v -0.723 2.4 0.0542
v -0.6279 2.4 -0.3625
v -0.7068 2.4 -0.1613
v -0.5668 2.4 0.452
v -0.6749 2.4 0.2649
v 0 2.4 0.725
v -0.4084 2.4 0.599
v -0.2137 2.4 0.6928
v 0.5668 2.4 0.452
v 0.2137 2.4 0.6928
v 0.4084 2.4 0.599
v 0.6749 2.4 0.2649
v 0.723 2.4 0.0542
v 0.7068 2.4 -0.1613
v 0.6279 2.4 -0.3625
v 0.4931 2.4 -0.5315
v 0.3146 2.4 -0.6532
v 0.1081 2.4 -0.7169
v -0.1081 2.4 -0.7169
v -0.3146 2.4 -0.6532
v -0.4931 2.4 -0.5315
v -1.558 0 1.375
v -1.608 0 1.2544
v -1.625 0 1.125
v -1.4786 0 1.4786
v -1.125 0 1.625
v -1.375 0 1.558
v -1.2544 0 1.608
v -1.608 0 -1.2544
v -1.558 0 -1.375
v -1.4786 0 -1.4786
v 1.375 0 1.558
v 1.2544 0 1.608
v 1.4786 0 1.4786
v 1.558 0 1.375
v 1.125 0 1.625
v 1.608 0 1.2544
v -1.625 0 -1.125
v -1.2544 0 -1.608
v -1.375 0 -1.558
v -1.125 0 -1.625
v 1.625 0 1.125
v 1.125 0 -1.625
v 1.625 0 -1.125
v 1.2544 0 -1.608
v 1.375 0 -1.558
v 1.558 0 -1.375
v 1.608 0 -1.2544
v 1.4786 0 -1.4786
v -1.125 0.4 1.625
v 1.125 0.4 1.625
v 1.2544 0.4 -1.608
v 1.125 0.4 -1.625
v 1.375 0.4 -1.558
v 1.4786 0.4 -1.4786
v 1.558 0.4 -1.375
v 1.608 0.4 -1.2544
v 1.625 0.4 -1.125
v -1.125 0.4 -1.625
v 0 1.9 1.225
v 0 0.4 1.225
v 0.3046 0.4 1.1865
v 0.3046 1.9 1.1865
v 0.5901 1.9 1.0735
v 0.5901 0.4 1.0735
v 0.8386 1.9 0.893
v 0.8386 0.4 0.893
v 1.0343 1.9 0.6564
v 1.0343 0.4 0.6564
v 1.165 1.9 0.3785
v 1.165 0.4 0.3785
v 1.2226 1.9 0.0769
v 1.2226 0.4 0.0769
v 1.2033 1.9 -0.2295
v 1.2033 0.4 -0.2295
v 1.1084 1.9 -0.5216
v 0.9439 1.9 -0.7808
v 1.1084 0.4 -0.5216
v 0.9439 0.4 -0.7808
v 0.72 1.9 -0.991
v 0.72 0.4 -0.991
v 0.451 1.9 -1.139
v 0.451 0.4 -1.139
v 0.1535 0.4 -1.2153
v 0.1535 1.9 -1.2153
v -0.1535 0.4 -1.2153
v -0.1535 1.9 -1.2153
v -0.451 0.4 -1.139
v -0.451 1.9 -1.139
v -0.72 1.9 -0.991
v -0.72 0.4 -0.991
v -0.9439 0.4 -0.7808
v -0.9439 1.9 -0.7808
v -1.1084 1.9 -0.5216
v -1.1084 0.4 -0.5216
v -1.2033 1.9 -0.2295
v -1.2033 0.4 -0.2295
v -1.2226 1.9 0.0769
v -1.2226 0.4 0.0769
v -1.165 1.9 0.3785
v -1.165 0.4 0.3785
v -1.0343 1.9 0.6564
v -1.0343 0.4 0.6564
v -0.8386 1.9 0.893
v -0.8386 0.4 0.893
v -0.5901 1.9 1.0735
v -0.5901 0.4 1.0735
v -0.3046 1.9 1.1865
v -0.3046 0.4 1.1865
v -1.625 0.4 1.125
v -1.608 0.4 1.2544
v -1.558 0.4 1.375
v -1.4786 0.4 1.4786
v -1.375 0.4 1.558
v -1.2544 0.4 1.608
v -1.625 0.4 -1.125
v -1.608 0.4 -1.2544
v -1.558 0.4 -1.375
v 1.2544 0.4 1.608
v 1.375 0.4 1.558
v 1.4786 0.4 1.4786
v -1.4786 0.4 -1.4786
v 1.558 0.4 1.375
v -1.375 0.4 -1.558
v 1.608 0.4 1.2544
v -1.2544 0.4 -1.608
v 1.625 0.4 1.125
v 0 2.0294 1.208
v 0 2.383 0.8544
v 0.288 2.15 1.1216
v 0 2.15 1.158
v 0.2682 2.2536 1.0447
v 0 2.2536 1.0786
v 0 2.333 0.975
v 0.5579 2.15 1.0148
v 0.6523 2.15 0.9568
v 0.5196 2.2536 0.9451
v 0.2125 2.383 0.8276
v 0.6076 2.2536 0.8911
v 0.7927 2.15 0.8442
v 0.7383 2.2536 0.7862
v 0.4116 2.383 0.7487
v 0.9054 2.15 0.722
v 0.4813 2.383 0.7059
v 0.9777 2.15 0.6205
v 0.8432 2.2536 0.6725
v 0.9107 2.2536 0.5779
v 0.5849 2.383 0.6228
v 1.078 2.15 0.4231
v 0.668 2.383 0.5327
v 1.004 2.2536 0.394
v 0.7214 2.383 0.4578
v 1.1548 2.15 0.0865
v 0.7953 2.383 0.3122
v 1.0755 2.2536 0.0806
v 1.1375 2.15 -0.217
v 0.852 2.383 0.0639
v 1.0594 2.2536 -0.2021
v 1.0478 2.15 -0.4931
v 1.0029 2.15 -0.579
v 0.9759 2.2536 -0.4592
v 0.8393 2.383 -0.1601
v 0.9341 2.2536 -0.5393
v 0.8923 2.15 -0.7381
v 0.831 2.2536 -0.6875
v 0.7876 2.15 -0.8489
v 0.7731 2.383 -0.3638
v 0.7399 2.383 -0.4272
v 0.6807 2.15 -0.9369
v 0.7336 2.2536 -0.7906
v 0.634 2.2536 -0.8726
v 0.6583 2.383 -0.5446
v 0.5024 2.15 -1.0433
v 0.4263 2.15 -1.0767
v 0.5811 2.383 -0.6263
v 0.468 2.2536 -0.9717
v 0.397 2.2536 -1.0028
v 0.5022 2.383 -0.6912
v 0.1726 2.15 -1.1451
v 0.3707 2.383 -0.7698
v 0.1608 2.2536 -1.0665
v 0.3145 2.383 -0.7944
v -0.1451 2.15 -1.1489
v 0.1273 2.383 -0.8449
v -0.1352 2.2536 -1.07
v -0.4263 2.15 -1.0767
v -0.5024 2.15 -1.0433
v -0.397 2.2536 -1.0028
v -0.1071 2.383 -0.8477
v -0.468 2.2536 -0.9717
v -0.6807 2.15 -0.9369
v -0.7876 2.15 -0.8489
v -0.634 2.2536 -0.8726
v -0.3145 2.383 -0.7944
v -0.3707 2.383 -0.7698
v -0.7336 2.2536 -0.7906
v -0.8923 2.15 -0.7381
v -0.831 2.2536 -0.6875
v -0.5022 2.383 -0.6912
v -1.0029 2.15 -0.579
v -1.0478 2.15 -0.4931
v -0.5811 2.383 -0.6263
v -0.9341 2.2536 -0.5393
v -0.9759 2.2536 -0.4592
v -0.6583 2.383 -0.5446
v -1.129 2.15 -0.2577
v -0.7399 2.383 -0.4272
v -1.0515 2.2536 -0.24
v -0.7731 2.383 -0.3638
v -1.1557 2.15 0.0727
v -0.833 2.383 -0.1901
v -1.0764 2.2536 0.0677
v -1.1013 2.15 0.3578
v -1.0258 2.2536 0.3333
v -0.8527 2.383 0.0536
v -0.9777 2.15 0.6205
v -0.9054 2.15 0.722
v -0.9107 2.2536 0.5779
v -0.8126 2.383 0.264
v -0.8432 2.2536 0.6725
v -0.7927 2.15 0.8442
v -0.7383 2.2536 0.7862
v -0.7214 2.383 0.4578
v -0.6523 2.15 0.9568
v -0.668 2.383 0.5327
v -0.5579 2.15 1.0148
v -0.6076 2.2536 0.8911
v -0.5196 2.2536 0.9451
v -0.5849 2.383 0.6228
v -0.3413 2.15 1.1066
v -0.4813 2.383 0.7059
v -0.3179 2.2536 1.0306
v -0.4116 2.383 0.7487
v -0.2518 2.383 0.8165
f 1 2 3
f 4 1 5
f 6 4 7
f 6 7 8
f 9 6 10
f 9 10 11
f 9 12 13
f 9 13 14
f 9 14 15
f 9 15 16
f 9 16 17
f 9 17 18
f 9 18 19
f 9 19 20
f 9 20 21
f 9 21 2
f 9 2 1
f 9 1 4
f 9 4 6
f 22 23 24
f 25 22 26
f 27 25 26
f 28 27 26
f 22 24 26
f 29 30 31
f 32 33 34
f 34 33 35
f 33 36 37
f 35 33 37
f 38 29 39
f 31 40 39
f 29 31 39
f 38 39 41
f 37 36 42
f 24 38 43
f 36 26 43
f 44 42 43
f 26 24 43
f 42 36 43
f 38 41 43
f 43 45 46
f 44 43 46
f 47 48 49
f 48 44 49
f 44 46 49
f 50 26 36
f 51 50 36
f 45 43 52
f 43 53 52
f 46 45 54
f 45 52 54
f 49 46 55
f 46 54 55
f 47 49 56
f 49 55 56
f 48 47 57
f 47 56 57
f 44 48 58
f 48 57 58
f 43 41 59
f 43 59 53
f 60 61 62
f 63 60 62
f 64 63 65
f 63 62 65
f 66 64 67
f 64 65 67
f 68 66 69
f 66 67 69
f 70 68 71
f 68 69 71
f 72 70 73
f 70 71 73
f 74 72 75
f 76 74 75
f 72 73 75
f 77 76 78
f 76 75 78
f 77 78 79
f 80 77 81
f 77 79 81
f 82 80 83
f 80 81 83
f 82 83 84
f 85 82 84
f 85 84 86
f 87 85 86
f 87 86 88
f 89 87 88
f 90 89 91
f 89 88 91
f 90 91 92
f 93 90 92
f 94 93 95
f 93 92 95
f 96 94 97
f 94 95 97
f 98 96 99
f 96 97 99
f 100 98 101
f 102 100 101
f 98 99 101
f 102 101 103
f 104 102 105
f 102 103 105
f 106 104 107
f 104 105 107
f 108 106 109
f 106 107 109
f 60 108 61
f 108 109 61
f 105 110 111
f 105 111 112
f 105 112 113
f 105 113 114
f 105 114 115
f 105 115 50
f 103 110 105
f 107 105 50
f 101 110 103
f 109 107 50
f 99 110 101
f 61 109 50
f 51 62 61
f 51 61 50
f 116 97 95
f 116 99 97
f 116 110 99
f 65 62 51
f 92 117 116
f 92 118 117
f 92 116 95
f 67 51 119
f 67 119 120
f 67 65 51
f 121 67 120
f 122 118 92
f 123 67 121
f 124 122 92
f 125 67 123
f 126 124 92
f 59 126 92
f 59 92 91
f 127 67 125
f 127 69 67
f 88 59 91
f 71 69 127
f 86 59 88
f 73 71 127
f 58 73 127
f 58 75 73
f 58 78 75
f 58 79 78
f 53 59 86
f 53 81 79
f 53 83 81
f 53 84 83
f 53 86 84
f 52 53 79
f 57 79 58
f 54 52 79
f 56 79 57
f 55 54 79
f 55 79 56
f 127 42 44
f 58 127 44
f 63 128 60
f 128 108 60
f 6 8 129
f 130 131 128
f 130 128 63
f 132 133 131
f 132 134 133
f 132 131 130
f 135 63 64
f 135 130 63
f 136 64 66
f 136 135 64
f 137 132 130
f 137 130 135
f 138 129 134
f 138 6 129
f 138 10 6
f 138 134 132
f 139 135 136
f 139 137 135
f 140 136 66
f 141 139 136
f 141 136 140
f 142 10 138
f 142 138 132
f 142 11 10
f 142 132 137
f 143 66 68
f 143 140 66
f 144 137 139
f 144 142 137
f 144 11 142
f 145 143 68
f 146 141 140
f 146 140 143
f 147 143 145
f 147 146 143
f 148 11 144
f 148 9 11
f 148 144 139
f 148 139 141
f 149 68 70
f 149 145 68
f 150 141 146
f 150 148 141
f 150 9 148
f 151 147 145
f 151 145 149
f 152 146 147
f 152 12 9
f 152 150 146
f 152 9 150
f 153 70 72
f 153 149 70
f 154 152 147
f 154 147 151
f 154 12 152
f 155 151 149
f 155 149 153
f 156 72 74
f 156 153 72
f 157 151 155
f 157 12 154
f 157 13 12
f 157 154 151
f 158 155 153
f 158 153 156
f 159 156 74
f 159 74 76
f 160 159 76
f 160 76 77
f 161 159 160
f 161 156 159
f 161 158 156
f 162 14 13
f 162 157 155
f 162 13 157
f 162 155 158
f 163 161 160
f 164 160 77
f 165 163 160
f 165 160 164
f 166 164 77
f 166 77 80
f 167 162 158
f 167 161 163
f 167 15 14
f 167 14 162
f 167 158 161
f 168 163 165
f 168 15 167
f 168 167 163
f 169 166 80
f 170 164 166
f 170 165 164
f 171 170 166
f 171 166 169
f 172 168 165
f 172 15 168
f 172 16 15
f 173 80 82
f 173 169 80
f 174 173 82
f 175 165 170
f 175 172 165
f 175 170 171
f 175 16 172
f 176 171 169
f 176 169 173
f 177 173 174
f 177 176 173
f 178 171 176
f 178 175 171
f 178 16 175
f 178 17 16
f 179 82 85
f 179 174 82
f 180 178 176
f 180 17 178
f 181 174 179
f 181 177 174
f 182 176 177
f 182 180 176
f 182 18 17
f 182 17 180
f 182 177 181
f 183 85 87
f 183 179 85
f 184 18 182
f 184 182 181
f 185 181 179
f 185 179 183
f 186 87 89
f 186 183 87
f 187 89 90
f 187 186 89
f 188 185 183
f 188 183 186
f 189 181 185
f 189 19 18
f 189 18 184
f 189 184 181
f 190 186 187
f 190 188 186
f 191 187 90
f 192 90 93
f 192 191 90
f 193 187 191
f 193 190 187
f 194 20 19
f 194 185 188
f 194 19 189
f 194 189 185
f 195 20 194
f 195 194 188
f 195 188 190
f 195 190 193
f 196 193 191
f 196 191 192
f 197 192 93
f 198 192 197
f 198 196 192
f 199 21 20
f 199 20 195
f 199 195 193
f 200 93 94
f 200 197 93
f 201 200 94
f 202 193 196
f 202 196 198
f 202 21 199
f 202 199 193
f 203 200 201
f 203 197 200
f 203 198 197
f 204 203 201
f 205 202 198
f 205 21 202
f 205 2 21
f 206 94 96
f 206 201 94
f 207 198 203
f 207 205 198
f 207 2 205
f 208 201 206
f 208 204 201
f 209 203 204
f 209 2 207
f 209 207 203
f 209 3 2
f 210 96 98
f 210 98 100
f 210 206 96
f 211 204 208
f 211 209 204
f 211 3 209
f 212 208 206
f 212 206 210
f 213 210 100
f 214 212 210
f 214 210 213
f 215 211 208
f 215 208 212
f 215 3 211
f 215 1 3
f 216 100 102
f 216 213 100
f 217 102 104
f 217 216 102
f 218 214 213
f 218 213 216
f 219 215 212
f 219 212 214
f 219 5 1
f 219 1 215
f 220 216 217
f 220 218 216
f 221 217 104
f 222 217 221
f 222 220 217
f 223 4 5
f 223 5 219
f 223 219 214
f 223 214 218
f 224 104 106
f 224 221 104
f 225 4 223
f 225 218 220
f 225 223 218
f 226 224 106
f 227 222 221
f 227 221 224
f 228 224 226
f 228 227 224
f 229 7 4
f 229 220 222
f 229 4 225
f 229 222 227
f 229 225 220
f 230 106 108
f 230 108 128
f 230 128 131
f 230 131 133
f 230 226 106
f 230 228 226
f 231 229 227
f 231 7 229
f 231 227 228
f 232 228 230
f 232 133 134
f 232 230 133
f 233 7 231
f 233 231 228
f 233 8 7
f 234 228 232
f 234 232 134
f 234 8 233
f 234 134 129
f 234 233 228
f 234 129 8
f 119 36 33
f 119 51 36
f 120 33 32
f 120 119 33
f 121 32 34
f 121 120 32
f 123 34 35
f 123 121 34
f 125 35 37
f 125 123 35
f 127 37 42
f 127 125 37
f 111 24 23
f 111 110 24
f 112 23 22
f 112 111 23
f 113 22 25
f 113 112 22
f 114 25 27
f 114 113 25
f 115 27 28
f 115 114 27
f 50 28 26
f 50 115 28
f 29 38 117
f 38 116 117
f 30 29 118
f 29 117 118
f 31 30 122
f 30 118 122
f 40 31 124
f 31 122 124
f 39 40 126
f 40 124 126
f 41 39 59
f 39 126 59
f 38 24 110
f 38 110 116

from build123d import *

# Parameters (mm, degrees)
SKETCH1_W           = 3.25
SKETCH1_H           = 3.25
BOSS_EXTRUDE1_DEPTH = 0.4
SKETCH2_R           = 1.225
BOSS_EXTRUDE2_DEPTH = 2
FILLET1_R           = 0.5
FILLET2_R           = 0.5


with BuildPart() as part:
    # Sketch1 → Boss-Extrude1 (new body)
    with BuildSketch(Plane(origin=(0, 0, 0), x_dir=(1, 0, 0), z_dir=(0, 1, 0))):
        Rectangle(SKETCH1_W, SKETCH1_H)
    extrude(amount=BOSS_EXTRUDE1_DEPTH)

    # Sketch2 → Boss-Extrude2 (add)
    with BuildSketch(Plane(origin=(0, 0.4, 0), x_dir=(1, 0, 0), z_dir=(0, 1, 0))):
        with Locations(Location((0, 0, 0), (0, 0, 270))):
            Circle(SKETCH2_R)
    extrude(amount=BOSS_EXTRUDE2_DEPTH)

    # Fillet1
    fillet1_edges = [part.edges().sort_by_distance(p)[0] for p in [
        (0, 2.4, -1.225),
    ]]
    fillet(fillet1_edges, radius=FILLET1_R)

    # Fillet2
    fillet2_edges = [part.edges().sort_by_distance(p)[0] for p in [
        (1.625, 0.2, 1.625),
        (-1.625, 0.2, 1.625),
        (-1.625, 0.2, -1.625),
        (1.625, 0.2, -1.625),
    ]]
    fillet(fillet2_edges, radius=FILLET2_R)


solid = part.part
